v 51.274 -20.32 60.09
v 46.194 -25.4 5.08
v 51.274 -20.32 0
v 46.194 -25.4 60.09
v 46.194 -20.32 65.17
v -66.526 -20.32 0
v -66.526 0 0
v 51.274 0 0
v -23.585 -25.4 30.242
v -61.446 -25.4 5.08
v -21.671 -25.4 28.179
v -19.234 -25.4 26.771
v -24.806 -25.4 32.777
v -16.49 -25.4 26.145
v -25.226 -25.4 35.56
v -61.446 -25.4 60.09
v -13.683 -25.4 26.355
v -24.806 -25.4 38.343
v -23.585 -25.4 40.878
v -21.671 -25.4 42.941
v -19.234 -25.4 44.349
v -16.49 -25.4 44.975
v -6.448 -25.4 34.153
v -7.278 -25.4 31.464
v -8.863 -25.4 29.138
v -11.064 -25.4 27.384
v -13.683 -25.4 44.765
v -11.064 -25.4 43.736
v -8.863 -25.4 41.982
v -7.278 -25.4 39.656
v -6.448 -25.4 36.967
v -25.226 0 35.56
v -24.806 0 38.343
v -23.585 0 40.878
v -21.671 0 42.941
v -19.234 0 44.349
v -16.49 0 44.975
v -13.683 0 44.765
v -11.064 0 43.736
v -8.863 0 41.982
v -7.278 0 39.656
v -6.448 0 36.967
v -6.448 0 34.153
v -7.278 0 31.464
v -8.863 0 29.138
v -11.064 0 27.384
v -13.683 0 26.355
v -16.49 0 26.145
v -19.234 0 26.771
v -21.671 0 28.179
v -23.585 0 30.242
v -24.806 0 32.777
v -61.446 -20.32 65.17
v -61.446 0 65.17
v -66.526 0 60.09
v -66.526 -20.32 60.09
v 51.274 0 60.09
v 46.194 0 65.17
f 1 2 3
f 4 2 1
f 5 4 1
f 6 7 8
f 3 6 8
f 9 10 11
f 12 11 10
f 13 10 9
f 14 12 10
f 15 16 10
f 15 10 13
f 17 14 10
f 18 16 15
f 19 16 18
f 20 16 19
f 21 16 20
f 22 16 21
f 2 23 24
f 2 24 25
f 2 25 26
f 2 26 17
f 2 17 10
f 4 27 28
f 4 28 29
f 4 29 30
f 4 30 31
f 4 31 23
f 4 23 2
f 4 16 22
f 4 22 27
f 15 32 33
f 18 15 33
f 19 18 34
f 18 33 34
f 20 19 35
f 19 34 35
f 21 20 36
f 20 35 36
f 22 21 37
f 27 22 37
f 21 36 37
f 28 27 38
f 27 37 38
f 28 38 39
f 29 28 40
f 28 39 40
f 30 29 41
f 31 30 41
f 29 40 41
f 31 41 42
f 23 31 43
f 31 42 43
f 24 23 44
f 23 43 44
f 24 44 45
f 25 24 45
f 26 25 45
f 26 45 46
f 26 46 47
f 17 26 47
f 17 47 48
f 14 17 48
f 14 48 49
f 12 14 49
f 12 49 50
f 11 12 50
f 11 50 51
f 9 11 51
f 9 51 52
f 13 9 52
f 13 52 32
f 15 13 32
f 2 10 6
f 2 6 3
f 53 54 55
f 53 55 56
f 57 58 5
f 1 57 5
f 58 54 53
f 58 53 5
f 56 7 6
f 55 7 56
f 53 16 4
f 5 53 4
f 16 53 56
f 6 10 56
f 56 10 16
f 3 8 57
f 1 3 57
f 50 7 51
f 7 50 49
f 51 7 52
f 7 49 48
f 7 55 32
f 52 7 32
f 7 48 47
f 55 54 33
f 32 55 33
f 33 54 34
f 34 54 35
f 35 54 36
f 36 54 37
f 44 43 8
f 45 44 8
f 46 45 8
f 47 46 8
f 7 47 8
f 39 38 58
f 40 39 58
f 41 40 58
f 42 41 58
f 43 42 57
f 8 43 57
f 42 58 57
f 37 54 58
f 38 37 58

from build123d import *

# Parameters (mm, degrees)
F0_W     = 117.799587
F0_H     = 65.169983
F1_DEPTH = 25.4
F2_SIZE  = 5.08
F3_R     = 9.441262
F4_DEPTH = 25.401


with BuildPart() as f1:
    # F0 (on Front) → F1 (new body)
    with BuildSketch(Plane.XZ):
        with Locations((-7.626143, 32.584992)):
            Rectangle(F0_W, F0_H)
    extrude(amount=F1_DEPTH)

    # F2
    f2_edges = [f1.edges().sort_by_distance(p)[0] for p in [
        (-66.525936, -12.7, 65.169983),
        (-7.626142, -25.4, 65.169983),
        (-66.525936, -25.4, 32.584991),
        (-7.626142, -25.4, 0),
        (51.273651, -25.4, 32.584991),
        (51.273651, -12.7, 65.169983),
    ]]
    chamfer(f2_edges, length=F2_SIZE)

    # F3 (on face) → F4 (cut, through all)
    with BuildSketch(Plane(origin=(0, 0, 0), x_dir=(-1, 0, 0), z_dir=(0, 1, 0))):
        with Locations((15.784286, 35.560001)):
            Circle(F3_R)
    extrude(amount=-F4_DEPTH, mode=Mode.SUBTRACT)


solid = f1.part
